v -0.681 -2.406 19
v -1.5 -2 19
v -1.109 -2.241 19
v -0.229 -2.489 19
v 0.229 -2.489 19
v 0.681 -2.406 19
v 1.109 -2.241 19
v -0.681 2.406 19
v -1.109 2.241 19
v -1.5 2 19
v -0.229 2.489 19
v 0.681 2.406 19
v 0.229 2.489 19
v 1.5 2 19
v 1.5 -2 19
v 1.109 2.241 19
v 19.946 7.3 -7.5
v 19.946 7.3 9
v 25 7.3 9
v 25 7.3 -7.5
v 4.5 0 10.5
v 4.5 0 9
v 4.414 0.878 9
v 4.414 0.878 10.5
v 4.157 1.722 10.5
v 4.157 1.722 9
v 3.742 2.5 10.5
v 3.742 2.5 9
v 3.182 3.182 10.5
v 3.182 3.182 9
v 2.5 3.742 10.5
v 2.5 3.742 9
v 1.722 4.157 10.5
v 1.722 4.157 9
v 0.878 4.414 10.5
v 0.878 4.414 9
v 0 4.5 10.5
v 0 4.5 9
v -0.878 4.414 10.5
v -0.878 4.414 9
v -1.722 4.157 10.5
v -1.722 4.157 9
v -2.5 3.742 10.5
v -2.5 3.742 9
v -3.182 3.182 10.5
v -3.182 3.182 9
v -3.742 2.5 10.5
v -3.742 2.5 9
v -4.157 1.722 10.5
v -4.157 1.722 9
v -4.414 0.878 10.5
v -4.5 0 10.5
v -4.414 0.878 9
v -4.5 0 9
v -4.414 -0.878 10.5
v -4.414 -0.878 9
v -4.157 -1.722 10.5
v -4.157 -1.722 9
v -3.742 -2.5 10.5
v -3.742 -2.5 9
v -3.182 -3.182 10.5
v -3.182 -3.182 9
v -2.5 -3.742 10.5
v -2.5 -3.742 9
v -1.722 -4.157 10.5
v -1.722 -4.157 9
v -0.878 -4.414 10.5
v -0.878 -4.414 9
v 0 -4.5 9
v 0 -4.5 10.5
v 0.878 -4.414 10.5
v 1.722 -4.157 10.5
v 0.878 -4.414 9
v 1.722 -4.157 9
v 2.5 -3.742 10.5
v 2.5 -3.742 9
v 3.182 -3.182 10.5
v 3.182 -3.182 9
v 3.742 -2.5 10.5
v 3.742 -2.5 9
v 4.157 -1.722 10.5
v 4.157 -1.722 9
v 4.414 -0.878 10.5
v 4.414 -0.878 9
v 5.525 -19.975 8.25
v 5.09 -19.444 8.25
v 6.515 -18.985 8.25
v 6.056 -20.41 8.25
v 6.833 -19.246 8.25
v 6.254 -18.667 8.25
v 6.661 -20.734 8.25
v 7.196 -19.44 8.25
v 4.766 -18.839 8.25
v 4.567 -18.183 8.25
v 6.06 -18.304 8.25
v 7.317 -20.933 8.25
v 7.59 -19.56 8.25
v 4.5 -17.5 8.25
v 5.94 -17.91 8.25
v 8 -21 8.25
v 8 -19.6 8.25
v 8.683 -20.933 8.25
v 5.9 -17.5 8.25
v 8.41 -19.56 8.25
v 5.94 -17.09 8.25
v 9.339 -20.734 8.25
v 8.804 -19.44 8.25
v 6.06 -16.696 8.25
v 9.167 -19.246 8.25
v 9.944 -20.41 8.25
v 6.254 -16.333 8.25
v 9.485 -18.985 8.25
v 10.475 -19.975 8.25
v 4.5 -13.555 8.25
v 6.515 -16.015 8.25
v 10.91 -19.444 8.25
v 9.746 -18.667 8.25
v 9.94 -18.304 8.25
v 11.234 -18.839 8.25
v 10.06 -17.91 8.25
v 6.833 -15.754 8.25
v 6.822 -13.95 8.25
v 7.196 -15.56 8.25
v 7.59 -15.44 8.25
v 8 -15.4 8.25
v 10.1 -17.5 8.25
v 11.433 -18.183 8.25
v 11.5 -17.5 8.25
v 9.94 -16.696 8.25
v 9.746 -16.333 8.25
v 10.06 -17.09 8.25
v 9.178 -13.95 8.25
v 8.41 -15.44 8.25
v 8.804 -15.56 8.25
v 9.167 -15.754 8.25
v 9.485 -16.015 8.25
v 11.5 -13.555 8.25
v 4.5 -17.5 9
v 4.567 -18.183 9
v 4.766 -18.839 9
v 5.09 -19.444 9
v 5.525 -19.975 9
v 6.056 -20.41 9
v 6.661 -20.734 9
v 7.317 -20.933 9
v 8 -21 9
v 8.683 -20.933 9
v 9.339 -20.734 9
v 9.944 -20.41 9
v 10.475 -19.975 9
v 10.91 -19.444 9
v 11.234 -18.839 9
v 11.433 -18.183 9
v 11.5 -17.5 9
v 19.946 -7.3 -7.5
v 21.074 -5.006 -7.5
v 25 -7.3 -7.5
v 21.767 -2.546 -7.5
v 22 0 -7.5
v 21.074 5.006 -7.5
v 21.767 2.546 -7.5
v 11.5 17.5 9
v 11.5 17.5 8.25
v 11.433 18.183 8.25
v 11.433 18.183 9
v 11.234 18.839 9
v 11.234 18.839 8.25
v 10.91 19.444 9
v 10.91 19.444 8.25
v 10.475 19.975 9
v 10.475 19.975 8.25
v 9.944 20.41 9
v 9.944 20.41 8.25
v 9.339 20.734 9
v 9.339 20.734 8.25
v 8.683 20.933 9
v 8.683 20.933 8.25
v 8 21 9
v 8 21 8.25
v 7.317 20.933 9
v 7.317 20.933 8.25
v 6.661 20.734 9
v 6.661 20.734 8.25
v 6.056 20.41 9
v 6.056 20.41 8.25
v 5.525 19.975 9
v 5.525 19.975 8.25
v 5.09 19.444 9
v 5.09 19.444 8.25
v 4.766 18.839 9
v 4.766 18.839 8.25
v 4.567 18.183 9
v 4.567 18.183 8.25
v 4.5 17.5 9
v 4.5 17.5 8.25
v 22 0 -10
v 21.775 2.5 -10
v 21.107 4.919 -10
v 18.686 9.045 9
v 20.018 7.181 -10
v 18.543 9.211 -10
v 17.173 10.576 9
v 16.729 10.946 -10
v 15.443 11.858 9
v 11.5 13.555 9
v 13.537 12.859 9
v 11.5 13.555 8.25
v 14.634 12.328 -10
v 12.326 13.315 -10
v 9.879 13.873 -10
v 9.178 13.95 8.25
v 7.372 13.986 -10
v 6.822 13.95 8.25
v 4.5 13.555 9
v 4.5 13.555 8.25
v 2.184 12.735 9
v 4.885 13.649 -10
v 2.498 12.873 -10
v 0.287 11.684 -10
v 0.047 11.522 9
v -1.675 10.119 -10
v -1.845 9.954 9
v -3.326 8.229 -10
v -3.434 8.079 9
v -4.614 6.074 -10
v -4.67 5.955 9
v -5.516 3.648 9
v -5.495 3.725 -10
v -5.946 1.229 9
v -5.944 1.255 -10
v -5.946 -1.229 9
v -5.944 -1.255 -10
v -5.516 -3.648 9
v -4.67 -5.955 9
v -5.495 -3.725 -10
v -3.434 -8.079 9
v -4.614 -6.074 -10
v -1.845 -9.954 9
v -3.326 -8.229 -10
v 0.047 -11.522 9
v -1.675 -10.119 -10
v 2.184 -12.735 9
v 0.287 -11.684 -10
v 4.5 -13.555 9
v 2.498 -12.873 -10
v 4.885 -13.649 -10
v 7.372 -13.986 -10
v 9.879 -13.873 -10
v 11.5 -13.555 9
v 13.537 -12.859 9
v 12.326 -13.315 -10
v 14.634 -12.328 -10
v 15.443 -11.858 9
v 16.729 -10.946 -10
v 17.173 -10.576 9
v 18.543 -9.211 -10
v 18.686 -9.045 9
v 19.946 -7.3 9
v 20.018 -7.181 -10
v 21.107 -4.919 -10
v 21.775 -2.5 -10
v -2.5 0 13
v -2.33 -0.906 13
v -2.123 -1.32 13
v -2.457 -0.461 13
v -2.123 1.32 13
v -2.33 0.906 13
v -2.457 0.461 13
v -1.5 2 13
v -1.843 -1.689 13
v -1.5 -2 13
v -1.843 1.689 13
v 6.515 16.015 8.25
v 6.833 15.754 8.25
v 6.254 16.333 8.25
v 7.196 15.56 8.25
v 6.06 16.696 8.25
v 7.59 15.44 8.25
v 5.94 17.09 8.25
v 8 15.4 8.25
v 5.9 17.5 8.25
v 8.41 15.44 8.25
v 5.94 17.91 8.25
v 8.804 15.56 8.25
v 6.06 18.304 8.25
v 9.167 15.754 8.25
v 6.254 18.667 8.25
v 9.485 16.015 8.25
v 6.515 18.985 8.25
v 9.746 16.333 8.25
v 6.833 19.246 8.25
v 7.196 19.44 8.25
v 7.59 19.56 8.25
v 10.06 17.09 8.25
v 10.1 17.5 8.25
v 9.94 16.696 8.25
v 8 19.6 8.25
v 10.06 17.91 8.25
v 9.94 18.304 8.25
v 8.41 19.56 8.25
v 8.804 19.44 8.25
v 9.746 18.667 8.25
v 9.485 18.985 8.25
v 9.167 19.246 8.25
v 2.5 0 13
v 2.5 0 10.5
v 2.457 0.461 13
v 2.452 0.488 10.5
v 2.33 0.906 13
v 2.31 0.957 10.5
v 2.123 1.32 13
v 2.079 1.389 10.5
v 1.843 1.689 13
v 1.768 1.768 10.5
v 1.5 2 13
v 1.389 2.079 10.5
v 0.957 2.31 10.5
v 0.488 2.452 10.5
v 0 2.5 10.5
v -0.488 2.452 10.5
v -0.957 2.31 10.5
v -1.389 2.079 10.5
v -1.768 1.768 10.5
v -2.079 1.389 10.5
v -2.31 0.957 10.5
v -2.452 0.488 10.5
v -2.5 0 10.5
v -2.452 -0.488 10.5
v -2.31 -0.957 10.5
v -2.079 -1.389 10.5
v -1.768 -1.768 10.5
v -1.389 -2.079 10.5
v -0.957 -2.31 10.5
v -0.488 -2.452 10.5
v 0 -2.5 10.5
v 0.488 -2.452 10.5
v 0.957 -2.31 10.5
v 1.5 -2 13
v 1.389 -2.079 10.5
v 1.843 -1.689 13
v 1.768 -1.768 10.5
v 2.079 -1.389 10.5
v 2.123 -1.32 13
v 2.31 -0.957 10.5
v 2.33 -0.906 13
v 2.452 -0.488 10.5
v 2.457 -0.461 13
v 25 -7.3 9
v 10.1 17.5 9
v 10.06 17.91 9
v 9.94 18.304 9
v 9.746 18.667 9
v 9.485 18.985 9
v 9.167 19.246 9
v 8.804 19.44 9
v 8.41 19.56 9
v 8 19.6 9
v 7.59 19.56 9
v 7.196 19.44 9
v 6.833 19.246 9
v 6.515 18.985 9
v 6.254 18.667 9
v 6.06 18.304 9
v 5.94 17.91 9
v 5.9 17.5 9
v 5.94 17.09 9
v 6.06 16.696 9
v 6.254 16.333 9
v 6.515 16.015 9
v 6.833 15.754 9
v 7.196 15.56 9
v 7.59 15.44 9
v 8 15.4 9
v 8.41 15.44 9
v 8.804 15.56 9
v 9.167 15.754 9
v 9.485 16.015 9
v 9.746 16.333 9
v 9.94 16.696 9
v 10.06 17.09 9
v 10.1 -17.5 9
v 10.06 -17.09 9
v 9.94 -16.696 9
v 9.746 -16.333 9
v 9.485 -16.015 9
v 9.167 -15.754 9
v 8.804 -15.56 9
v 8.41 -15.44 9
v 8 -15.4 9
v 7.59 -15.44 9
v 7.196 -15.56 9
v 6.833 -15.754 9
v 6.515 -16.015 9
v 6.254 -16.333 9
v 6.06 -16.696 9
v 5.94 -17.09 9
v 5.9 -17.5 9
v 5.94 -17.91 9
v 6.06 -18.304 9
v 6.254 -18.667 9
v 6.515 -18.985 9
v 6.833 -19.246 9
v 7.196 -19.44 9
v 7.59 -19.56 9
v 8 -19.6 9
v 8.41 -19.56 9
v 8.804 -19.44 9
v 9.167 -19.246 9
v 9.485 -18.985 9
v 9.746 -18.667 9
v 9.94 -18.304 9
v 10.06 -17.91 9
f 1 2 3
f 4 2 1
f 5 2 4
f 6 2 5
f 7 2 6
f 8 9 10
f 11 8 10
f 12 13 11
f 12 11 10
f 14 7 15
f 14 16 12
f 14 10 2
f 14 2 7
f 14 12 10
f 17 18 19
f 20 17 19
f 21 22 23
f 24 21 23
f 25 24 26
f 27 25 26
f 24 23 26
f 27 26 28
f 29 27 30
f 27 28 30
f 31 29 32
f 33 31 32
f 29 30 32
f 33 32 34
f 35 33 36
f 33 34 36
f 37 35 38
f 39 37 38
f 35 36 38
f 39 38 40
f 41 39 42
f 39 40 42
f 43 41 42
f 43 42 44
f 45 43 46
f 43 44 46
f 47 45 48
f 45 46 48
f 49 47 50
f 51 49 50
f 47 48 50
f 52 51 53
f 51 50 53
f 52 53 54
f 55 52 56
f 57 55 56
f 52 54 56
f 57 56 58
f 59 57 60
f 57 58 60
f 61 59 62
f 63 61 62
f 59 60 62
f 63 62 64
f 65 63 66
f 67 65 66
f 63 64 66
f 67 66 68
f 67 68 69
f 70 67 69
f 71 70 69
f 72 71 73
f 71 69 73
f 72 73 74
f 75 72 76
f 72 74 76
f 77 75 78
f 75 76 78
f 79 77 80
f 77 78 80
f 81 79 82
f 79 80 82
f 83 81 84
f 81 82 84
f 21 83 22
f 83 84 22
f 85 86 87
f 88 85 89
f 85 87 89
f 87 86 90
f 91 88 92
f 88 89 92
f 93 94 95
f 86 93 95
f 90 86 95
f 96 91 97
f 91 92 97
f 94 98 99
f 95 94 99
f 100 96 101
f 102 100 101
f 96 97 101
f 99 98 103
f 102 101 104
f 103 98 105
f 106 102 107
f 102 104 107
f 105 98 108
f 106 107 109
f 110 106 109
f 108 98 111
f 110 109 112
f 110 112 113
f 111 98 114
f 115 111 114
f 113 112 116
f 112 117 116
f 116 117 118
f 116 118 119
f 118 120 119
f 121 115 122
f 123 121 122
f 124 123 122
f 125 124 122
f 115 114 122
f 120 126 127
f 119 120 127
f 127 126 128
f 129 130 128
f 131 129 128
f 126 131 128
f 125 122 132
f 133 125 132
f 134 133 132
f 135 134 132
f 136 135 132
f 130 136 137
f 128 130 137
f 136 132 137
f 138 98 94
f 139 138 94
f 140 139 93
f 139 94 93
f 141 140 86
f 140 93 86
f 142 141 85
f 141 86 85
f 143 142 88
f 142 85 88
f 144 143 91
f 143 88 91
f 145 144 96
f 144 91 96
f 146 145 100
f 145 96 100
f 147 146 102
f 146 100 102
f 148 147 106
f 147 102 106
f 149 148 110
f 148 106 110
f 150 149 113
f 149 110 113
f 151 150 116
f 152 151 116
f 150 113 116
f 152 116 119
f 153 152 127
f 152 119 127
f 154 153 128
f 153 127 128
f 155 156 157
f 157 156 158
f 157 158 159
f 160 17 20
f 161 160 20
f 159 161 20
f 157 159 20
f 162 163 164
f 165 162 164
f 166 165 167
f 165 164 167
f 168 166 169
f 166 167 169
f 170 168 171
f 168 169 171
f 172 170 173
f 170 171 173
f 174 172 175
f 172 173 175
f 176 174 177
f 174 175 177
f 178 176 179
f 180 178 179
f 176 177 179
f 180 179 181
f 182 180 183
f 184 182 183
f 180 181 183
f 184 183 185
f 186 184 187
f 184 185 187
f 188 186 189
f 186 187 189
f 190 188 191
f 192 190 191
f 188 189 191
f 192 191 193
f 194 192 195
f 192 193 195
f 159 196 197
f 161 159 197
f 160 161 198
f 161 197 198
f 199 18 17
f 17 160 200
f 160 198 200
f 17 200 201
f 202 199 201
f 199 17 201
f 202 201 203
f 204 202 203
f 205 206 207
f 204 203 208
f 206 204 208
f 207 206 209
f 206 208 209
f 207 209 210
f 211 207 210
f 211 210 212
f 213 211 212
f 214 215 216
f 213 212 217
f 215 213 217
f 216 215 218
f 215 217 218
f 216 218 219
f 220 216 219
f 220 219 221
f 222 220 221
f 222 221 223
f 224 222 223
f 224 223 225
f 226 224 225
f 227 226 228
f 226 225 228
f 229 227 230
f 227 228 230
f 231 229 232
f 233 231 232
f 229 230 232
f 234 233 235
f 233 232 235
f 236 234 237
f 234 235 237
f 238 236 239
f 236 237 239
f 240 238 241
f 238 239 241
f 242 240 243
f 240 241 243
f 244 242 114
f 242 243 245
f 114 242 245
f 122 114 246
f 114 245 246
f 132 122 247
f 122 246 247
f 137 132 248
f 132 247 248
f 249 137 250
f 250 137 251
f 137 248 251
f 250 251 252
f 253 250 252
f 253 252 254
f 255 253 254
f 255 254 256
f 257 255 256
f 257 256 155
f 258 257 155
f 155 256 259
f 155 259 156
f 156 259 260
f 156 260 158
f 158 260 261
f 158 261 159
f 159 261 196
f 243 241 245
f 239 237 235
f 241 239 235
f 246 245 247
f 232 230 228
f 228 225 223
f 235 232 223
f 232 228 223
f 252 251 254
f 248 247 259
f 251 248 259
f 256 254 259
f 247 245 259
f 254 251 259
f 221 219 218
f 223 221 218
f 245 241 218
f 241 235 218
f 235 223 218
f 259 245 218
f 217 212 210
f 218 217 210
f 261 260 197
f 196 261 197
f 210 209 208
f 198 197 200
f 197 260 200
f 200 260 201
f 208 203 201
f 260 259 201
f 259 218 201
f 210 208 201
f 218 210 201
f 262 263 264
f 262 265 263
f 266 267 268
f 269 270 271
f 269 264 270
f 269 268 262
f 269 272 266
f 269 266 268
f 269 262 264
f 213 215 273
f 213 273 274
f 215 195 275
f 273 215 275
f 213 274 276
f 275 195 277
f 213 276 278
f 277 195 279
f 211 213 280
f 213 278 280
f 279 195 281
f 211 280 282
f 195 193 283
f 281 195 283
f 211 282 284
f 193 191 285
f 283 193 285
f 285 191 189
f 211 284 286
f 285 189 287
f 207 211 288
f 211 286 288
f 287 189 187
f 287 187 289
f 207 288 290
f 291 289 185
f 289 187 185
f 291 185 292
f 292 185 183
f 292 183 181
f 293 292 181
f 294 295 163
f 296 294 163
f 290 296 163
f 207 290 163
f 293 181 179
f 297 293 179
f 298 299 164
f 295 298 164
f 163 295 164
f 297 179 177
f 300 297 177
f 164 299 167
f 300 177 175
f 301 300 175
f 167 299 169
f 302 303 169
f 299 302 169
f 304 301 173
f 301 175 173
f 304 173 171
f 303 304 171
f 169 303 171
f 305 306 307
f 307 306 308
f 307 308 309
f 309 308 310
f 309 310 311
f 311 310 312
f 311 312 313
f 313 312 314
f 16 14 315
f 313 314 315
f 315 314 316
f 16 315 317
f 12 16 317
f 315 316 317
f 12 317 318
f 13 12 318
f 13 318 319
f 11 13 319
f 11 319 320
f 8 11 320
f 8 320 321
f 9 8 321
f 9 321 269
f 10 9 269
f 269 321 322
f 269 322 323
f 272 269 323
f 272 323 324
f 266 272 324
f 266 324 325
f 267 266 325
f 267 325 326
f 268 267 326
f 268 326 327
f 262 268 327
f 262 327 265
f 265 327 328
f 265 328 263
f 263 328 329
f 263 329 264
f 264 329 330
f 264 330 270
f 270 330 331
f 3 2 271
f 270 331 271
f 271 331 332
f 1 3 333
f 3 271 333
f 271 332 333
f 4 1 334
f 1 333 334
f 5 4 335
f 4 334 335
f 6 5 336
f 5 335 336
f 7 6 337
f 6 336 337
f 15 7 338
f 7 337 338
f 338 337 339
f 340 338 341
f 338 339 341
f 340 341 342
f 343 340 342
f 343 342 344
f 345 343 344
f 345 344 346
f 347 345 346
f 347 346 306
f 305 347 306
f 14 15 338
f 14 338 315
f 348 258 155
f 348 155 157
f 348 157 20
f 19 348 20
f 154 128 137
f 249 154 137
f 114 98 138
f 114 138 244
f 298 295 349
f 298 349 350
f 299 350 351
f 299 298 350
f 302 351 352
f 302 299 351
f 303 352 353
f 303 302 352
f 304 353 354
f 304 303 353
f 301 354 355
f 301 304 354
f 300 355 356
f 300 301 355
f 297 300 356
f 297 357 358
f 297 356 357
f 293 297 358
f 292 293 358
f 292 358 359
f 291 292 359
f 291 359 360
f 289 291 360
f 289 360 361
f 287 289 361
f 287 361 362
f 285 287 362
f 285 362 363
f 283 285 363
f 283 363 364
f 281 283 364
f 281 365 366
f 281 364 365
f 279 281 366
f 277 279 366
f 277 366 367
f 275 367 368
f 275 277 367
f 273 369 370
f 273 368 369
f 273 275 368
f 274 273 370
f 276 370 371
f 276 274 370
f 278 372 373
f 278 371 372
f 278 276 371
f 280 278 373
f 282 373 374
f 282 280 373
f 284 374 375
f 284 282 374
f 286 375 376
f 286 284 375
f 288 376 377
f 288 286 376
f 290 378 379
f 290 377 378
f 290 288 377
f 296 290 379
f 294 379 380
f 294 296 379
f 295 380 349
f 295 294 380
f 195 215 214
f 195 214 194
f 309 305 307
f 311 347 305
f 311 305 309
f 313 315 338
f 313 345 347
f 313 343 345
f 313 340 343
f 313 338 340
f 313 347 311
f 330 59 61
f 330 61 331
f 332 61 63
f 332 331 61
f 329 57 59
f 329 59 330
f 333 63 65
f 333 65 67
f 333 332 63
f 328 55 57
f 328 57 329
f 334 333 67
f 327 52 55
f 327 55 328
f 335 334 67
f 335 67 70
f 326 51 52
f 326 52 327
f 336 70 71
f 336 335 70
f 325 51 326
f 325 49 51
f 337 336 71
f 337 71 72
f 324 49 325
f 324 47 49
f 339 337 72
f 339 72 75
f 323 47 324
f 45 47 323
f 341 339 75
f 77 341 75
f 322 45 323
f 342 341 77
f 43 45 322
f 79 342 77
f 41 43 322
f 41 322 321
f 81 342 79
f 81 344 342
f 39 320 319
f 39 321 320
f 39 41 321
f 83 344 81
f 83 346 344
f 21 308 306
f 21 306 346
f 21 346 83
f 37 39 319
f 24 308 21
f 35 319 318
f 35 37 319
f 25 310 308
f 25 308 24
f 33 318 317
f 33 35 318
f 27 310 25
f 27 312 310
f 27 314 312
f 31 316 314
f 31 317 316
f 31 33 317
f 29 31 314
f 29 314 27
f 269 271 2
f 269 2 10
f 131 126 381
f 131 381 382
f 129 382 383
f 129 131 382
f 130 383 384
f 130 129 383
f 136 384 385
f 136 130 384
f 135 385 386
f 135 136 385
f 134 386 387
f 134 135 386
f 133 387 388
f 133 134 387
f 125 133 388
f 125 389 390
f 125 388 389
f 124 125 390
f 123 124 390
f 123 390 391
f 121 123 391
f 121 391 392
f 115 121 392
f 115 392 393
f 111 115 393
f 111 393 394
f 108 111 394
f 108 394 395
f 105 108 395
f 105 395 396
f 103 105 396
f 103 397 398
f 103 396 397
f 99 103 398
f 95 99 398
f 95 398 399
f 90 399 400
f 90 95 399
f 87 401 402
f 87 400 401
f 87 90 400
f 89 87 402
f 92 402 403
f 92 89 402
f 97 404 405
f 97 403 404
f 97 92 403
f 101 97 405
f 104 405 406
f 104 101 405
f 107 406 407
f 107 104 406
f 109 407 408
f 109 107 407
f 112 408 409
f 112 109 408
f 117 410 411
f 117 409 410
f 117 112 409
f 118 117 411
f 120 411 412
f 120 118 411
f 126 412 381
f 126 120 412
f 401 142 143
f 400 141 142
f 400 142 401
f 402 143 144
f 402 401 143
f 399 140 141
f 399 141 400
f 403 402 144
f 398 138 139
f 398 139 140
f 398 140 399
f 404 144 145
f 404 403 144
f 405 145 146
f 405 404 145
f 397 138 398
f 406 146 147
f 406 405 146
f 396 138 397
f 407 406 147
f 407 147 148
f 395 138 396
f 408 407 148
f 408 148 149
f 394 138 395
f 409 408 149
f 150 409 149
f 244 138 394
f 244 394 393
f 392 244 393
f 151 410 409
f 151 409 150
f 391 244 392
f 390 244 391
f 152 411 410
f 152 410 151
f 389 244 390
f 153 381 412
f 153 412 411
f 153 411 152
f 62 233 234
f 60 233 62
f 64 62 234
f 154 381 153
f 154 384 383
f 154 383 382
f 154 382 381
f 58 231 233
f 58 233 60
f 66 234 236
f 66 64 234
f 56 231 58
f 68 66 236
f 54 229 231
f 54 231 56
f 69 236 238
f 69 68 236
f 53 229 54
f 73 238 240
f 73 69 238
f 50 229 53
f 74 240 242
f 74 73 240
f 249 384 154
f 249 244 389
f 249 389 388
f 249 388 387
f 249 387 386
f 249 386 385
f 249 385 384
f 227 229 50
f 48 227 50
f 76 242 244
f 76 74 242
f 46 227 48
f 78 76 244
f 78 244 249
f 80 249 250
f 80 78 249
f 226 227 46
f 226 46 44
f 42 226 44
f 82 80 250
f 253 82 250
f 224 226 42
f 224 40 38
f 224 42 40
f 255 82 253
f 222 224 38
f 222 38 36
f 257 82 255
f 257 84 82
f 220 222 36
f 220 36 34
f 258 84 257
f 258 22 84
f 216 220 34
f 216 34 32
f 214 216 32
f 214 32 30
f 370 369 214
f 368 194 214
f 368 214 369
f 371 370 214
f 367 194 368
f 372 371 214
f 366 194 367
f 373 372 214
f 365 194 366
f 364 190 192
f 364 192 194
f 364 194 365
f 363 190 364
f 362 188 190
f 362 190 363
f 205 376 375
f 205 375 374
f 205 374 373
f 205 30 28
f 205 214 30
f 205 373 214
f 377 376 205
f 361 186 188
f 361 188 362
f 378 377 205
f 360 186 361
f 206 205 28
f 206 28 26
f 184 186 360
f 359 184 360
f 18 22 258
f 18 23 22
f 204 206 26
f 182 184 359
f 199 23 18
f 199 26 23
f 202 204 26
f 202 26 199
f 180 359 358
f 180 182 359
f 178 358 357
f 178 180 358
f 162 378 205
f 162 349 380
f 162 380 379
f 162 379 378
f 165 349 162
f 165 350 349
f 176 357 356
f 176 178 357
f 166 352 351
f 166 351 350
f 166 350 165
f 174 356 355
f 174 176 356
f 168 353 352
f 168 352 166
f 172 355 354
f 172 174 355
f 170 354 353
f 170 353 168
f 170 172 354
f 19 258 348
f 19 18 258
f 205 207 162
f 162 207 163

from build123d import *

# Parameters (mm, degrees)
BOX001_W          = 17
BOX001_H          = 14.6
BOX001_DEPTH      = 16.5
CYLINDER005_R     = 2.1
CYLINDER005_DEPTH = 2
CYLINDER004_R     = 2.1
CYLINDER004_DEPTH = 2
CYLINDER007_R     = 3.5
CYLINDER007_DEPTH = 0.75
BOX_W             = 7
BOX_H             = 35
BOX_DEPTH         = 0.75
CYLINDER006_R     = 3.5
CYLINDER006_DEPTH = 0.75
CYLINDER001_R     = 4.5
CYLINDER001_DEPTH = 1.5
CYLINDER_R        = 14
CYLINDER_DEPTH    = 19
BOX003_W          = 1
BOX003_H          = 5
BOX003_DEPTH      = 6
BOX002_W          = 1
BOX002_H          = 5
BOX002_DEPTH      = 6
CYLINDER003_R     = 2.5
CYLINDER003_DEPTH = 8.5


with BuildPart() as cube001:
    # Box001 → Box001 (new body)
    with BuildSketch(Plane(origin=(0, -7.3, 2.5), x_dir=(1, 0, 0), z_dir=(0, 0, 1))):
        with Locations((8.5, 7.3)):
            Rectangle(BOX001_W, BOX001_H)
    extrude(amount=BOX001_DEPTH)


with BuildPart() as cylinder005:
    # Cylinder005 → Cylinder005 (new body)
    with BuildSketch(Plane(origin=(0, 17.5, 18), x_dir=(1, 0, 0), z_dir=(0, 0, 1))):
        Circle(CYLINDER005_R)
    extrude(amount=CYLINDER005_DEPTH)


with BuildPart() as cylinder004:
    # Cylinder004 → Cylinder004 (new body)
    with BuildSketch(Plane(origin=(0, -17.5, 18), x_dir=(1, 0, 0), z_dir=(0, 0, 1))):
        Circle(CYLINDER004_R)
    extrude(amount=CYLINDER004_DEPTH)


with BuildPart() as cylinder007:
    # Cylinder007 → Cylinder007 (new body)
    with BuildSketch(Plane(origin=(0, 17.5, 18), x_dir=(1, 0, 0), z_dir=(0, 0, 1))):
        Circle(CYLINDER007_R)
    extrude(amount=CYLINDER007_DEPTH)


with BuildPart() as cube:
    # Box → Box (new body)
    with BuildSketch(Plane(origin=(-3.5, -17.5, 18), x_dir=(1, 0, 0), z_dir=(0, 0, 1))):
        with Locations((3.5, 17.5)):
            Rectangle(BOX_W, BOX_H)
    extrude(amount=BOX_DEPTH)


with BuildPart() as cut001:
    # Cylinder006 → Cylinder006 (new body)
    with BuildSketch(Plane(origin=(0, -17.5, 18), x_dir=(1, 0, 0), z_dir=(0, 0, 1))):
        Circle(CYLINDER006_R)
    extrude(amount=CYLINDER006_DEPTH)

    # Fusion: union Cylinder007, Cube
    add(cylinder007.part)
    add(cube.part)


with BuildPart() as cut001_1:
    # Fusion placement: moved
    add(cut001.part.moved(Location((0, 0, 0.25))))

    # Cut: cut Cylinder004
    add(cylinder004.part, mode=Mode.SUBTRACT)

    # Cut001: cut Cylinder005
    add(cylinder005.part, mode=Mode.SUBTRACT)


with BuildPart() as cylinder001:
    # Cylinder001 → Cylinder001 (new body)
    with BuildSketch(Plane(origin=(-8, 0, 19), x_dir=(1, 0, 0), z_dir=(0, 0, 1))):
        Circle(CYLINDER001_R)
    extrude(amount=CYLINDER001_DEPTH)


with BuildPart() as cylinder:
    # Cylinder → Cylinder (new body)
    with BuildSketch(Plane.XY):
        Circle(CYLINDER_R)
    extrude(amount=CYLINDER_DEPTH)


with BuildPart() as cube003:
    # Box003 → Box003 (new body)
    with BuildSketch(Plane(origin=(-10.5, -2.5, 23), x_dir=(1, 0, 0), z_dir=(0, 0, 1))):
        with Locations((0.5, 2.5)):
            Rectangle(BOX003_W, BOX003_H)
    extrude(amount=BOX003_DEPTH)


with BuildPart() as cube002:
    # Box002 → Box002 (new body)
    with BuildSketch(Plane(origin=(-6.5, -2.5, 23), x_dir=(1, 0, 0), z_dir=(0, 0, 1))):
        with Locations((0.5, 2.5)):
            Rectangle(BOX002_W, BOX002_H)
    extrude(amount=BOX002_DEPTH)


with BuildPart() as motor:
    # Cylinder003 → Cylinder003 (new body)
    with BuildSketch(Plane(origin=(-8, 0, 20.5), x_dir=(1, 0, 0), z_dir=(0, 0, 1))):
        Circle(CYLINDER003_R)
    extrude(amount=CYLINDER003_DEPTH)

    # Cut002: cut Cube002
    add(cube002.part, mode=Mode.SUBTRACT)

    # Cut003: cut Cube003
    add(cube003.part, mode=Mode.SUBTRACT)

    # Fusion001: union Cube001, Cut001, Cylinder001, Cylinder
    add(cube001.part)
    add(cut001_1.part)
    add(cylinder001.part)
    add(cylinder.part)


with BuildPart() as motor_1:
    # Fusion001 placement: moved
    add(motor.part.moved(Location((8, 0, -10))))


solid = motor_1.part
